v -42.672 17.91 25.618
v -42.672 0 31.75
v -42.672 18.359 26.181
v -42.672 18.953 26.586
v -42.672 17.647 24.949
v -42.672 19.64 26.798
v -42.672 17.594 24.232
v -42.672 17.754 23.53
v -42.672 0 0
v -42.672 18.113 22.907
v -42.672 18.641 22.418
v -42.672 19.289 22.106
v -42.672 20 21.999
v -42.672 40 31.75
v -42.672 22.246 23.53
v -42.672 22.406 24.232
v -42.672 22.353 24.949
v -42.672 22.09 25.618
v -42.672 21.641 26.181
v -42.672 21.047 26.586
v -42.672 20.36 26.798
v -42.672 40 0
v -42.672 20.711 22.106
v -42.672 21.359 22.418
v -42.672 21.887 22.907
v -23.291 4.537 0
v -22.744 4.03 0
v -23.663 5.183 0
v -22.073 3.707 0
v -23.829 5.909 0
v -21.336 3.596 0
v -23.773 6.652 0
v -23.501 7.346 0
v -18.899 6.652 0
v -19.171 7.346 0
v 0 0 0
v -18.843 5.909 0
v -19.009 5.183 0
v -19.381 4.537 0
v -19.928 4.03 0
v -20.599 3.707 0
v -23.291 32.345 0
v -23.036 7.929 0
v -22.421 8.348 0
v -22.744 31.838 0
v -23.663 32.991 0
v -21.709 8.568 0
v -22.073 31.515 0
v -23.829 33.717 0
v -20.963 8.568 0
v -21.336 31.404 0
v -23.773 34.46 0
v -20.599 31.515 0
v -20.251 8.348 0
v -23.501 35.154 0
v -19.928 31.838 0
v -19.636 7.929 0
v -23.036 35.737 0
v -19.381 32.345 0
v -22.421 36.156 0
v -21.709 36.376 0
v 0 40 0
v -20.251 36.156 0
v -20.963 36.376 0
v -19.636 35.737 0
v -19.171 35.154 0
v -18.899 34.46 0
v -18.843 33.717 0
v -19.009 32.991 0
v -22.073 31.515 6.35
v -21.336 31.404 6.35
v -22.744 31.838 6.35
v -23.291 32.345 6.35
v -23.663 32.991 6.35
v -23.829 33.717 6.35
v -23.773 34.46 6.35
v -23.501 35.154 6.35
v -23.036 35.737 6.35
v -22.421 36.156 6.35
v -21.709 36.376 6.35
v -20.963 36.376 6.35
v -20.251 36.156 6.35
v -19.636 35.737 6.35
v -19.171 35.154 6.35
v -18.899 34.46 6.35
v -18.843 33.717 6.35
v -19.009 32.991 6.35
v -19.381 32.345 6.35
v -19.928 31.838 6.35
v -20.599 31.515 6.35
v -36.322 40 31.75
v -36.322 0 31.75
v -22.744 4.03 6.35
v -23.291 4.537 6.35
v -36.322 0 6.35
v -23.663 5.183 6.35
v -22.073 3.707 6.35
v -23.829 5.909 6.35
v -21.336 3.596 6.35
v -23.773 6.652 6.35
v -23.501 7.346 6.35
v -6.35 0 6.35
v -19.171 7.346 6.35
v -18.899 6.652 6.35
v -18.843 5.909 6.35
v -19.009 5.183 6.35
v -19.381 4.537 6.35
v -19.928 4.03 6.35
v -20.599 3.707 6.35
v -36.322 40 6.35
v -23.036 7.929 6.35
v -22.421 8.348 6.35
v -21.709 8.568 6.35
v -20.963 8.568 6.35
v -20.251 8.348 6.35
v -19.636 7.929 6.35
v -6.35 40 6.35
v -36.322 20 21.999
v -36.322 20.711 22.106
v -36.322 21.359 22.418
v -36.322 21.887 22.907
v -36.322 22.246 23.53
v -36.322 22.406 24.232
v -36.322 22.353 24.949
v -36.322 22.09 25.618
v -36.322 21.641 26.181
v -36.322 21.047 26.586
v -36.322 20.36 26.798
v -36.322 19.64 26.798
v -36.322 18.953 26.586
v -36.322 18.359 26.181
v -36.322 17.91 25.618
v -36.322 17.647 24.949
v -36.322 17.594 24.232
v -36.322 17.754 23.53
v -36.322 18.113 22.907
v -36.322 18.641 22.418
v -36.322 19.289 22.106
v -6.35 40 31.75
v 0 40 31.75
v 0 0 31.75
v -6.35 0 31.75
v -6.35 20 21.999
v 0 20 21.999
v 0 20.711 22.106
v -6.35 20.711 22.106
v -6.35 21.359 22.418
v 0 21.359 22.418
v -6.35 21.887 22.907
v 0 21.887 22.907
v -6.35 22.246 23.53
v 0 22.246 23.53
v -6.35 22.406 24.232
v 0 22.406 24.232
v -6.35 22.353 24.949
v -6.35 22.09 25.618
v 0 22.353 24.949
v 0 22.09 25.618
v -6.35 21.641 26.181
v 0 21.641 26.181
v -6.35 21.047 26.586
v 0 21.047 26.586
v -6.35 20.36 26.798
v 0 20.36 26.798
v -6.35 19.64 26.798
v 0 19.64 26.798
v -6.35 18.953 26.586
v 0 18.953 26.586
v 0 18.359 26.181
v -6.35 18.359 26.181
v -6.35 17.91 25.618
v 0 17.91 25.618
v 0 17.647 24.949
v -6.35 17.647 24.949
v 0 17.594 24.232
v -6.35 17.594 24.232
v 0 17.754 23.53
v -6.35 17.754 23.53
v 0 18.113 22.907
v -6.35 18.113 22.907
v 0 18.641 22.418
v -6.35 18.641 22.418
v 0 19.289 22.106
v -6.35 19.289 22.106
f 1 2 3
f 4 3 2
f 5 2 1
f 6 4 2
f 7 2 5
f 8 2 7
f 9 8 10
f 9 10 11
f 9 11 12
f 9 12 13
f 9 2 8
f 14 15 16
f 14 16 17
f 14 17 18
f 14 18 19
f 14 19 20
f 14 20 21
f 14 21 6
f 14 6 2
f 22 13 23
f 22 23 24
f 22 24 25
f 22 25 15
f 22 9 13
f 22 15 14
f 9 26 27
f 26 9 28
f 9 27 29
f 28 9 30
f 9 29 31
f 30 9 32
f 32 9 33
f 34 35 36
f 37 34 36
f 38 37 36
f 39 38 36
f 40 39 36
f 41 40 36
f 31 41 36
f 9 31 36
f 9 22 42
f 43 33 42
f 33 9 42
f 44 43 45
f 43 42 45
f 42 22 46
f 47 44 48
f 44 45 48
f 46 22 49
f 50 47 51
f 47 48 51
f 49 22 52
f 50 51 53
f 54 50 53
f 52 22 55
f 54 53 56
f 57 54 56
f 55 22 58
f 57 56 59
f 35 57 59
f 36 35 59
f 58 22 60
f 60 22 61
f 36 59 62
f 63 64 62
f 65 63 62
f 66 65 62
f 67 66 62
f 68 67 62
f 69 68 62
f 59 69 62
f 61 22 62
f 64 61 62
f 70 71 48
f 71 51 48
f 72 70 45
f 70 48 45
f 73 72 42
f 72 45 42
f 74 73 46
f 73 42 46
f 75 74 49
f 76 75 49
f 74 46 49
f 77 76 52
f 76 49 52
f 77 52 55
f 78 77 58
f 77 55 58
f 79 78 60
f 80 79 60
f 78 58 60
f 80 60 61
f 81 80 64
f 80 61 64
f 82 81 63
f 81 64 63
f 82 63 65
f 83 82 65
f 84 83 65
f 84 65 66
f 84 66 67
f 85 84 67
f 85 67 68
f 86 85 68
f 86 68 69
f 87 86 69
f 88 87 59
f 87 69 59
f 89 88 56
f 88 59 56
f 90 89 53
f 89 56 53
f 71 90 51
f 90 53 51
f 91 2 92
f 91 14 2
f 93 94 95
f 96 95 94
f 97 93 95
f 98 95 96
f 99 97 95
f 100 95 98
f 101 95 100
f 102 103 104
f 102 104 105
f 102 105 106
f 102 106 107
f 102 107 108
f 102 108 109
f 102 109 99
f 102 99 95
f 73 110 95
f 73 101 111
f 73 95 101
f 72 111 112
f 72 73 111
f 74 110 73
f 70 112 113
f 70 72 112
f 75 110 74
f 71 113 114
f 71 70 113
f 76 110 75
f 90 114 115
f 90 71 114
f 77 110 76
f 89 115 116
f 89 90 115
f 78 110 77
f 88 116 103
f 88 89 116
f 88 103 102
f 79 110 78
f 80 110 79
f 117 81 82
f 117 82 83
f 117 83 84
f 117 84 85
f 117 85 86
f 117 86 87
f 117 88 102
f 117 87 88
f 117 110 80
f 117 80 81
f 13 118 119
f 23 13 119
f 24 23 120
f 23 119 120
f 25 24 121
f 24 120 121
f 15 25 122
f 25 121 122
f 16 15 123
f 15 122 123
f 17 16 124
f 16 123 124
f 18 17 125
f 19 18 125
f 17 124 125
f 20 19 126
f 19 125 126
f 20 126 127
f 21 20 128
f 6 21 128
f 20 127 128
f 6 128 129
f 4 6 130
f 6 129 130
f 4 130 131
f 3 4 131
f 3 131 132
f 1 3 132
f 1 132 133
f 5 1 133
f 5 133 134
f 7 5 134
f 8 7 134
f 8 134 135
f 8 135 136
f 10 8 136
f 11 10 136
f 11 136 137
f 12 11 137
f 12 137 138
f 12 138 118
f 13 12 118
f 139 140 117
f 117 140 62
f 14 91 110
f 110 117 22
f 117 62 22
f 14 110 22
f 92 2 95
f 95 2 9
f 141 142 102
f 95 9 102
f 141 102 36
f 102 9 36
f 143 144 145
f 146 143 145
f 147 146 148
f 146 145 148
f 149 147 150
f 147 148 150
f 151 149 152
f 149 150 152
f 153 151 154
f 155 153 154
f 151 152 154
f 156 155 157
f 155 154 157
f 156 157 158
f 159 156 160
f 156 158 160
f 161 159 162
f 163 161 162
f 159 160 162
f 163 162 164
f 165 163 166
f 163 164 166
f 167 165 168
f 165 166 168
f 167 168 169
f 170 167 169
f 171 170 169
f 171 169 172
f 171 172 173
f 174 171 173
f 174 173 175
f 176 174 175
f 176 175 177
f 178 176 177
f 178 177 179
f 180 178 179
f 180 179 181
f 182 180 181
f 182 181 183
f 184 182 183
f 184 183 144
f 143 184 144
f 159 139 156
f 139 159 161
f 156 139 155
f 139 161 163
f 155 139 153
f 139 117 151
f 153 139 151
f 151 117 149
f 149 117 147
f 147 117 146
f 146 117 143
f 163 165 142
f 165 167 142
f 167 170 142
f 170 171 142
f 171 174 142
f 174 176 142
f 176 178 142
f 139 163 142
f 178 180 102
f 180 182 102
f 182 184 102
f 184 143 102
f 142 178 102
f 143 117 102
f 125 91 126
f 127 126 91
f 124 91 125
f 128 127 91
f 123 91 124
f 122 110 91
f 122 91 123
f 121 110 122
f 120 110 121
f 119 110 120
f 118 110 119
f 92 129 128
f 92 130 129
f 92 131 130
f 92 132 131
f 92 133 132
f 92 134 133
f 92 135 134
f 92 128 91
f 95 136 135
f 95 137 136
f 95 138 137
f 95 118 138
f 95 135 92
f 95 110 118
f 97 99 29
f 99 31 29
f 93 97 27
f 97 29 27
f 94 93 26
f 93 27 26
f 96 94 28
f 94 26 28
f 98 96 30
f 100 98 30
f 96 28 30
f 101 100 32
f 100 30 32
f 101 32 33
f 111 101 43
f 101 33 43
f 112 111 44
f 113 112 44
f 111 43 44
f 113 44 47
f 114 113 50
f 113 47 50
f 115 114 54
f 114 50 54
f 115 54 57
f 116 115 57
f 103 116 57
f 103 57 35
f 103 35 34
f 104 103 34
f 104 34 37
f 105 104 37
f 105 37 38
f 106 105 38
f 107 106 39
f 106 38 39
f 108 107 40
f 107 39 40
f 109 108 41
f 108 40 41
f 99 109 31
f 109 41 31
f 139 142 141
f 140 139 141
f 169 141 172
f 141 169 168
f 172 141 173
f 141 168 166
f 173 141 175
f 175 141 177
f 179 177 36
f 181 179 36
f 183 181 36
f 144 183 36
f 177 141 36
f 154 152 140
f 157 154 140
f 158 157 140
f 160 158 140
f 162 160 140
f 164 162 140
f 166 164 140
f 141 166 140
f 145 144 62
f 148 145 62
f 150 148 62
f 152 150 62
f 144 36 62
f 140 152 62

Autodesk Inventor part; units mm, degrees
ref_plane "YZ Plane" through (0, 0, 0) normal (1, 0, 0) x (0, 1, 0)
ref_plane "XZ Plane" through (0, 0, 0) normal (0, 1, 0) x (-1, 0, 0)
ref_plane "XY Plane" through (0, 0, 0) normal (0, 0, 1) x (1, 0, 0)
sketch "Sketch1" plane through (0, 0, 0) normal (0, 0, 1) x (1, 0, 0)
  line L0 (0, 0) -> (-42.672, 0)
  line L1 (-42.672, 0) -> (-42.672, 40)
  line L2 (-42.672, 40) -> (0, 40)
  line L3 (0, 40) -> (0, 0)
  dimension "d0" = 42.672
  dimension "d1" = 40
extrude "Extrusion1" add sketch "Sketch1" along normal blind 6.35
sketch "Sketch2" plane through (0, 0, 6.35) normal (0, 0, 1) x (1, 0, 0)
  line L0 (-42.672, 0) -> (0, 0) projected
  line L1 (-42.672, 40) -> (-36.322, 40)
  line L2 (-36.322, 40) -> (-36.322, 0)
  line L3 (-36.322, 0) -> (-42.672, 0)
  line L4 (-42.672, 0) -> (-42.672, 40)
  dimension "d4" = 6.35
extrude "Extrusion2" add sketch "Sketch2" along normal blind 25.4
sketch "Sketch3" plane through (0, 0, 6.35) normal (0, 0, 1) x (1, 0, 0)
  line L0 (-36.322, 0) -> (0, 0) projected
  line L1 (0, 40) -> (-6.35, 40)
  line L2 (-6.35, 40) -> (-6.35, 0)
  line L3 (-6.35, 0) -> (0, 0)
  line L4 (0, 0) -> (0, 40)
  dimension "d7" = 6.35
extrude "Extrusion3" add sketch "Sketch3" along normal blind 25.4
sketch "Sketch4" plane through (0, 0, 0) normal (1, 0, 0) x (0, 0, -1)
  circle A0 centre (-24.4119, 20) radius 2.413
  dimension "d10" = 4.826
extrude "Extrusion4" cut sketch "Sketch4" against normal blind 76.2
sketch "Sketch5" plane through (0, 0, 6.35) normal (0, 0, 1) x (1, 0, 0)
  line L0 (-6.35, 40) -> (-36.322, 40) projected
  line L1 (-36.322, 0) -> (-6.35, 0) projected
  point P0 (0, 0)
  point P1 (-21.336, 33.904)
  point P2 (-21.336, 6.096)
  dimension "d13" = 6.096
  dimension "d14" = 6.096
hole "Hole1" at (-21.336, 33.904, 6.35) at (-21.336, 6.096, 6.35) direction (0, 0, -1) diameter 5 end through all
properties part number "LiftBase2" material "Aluminum 6061"
